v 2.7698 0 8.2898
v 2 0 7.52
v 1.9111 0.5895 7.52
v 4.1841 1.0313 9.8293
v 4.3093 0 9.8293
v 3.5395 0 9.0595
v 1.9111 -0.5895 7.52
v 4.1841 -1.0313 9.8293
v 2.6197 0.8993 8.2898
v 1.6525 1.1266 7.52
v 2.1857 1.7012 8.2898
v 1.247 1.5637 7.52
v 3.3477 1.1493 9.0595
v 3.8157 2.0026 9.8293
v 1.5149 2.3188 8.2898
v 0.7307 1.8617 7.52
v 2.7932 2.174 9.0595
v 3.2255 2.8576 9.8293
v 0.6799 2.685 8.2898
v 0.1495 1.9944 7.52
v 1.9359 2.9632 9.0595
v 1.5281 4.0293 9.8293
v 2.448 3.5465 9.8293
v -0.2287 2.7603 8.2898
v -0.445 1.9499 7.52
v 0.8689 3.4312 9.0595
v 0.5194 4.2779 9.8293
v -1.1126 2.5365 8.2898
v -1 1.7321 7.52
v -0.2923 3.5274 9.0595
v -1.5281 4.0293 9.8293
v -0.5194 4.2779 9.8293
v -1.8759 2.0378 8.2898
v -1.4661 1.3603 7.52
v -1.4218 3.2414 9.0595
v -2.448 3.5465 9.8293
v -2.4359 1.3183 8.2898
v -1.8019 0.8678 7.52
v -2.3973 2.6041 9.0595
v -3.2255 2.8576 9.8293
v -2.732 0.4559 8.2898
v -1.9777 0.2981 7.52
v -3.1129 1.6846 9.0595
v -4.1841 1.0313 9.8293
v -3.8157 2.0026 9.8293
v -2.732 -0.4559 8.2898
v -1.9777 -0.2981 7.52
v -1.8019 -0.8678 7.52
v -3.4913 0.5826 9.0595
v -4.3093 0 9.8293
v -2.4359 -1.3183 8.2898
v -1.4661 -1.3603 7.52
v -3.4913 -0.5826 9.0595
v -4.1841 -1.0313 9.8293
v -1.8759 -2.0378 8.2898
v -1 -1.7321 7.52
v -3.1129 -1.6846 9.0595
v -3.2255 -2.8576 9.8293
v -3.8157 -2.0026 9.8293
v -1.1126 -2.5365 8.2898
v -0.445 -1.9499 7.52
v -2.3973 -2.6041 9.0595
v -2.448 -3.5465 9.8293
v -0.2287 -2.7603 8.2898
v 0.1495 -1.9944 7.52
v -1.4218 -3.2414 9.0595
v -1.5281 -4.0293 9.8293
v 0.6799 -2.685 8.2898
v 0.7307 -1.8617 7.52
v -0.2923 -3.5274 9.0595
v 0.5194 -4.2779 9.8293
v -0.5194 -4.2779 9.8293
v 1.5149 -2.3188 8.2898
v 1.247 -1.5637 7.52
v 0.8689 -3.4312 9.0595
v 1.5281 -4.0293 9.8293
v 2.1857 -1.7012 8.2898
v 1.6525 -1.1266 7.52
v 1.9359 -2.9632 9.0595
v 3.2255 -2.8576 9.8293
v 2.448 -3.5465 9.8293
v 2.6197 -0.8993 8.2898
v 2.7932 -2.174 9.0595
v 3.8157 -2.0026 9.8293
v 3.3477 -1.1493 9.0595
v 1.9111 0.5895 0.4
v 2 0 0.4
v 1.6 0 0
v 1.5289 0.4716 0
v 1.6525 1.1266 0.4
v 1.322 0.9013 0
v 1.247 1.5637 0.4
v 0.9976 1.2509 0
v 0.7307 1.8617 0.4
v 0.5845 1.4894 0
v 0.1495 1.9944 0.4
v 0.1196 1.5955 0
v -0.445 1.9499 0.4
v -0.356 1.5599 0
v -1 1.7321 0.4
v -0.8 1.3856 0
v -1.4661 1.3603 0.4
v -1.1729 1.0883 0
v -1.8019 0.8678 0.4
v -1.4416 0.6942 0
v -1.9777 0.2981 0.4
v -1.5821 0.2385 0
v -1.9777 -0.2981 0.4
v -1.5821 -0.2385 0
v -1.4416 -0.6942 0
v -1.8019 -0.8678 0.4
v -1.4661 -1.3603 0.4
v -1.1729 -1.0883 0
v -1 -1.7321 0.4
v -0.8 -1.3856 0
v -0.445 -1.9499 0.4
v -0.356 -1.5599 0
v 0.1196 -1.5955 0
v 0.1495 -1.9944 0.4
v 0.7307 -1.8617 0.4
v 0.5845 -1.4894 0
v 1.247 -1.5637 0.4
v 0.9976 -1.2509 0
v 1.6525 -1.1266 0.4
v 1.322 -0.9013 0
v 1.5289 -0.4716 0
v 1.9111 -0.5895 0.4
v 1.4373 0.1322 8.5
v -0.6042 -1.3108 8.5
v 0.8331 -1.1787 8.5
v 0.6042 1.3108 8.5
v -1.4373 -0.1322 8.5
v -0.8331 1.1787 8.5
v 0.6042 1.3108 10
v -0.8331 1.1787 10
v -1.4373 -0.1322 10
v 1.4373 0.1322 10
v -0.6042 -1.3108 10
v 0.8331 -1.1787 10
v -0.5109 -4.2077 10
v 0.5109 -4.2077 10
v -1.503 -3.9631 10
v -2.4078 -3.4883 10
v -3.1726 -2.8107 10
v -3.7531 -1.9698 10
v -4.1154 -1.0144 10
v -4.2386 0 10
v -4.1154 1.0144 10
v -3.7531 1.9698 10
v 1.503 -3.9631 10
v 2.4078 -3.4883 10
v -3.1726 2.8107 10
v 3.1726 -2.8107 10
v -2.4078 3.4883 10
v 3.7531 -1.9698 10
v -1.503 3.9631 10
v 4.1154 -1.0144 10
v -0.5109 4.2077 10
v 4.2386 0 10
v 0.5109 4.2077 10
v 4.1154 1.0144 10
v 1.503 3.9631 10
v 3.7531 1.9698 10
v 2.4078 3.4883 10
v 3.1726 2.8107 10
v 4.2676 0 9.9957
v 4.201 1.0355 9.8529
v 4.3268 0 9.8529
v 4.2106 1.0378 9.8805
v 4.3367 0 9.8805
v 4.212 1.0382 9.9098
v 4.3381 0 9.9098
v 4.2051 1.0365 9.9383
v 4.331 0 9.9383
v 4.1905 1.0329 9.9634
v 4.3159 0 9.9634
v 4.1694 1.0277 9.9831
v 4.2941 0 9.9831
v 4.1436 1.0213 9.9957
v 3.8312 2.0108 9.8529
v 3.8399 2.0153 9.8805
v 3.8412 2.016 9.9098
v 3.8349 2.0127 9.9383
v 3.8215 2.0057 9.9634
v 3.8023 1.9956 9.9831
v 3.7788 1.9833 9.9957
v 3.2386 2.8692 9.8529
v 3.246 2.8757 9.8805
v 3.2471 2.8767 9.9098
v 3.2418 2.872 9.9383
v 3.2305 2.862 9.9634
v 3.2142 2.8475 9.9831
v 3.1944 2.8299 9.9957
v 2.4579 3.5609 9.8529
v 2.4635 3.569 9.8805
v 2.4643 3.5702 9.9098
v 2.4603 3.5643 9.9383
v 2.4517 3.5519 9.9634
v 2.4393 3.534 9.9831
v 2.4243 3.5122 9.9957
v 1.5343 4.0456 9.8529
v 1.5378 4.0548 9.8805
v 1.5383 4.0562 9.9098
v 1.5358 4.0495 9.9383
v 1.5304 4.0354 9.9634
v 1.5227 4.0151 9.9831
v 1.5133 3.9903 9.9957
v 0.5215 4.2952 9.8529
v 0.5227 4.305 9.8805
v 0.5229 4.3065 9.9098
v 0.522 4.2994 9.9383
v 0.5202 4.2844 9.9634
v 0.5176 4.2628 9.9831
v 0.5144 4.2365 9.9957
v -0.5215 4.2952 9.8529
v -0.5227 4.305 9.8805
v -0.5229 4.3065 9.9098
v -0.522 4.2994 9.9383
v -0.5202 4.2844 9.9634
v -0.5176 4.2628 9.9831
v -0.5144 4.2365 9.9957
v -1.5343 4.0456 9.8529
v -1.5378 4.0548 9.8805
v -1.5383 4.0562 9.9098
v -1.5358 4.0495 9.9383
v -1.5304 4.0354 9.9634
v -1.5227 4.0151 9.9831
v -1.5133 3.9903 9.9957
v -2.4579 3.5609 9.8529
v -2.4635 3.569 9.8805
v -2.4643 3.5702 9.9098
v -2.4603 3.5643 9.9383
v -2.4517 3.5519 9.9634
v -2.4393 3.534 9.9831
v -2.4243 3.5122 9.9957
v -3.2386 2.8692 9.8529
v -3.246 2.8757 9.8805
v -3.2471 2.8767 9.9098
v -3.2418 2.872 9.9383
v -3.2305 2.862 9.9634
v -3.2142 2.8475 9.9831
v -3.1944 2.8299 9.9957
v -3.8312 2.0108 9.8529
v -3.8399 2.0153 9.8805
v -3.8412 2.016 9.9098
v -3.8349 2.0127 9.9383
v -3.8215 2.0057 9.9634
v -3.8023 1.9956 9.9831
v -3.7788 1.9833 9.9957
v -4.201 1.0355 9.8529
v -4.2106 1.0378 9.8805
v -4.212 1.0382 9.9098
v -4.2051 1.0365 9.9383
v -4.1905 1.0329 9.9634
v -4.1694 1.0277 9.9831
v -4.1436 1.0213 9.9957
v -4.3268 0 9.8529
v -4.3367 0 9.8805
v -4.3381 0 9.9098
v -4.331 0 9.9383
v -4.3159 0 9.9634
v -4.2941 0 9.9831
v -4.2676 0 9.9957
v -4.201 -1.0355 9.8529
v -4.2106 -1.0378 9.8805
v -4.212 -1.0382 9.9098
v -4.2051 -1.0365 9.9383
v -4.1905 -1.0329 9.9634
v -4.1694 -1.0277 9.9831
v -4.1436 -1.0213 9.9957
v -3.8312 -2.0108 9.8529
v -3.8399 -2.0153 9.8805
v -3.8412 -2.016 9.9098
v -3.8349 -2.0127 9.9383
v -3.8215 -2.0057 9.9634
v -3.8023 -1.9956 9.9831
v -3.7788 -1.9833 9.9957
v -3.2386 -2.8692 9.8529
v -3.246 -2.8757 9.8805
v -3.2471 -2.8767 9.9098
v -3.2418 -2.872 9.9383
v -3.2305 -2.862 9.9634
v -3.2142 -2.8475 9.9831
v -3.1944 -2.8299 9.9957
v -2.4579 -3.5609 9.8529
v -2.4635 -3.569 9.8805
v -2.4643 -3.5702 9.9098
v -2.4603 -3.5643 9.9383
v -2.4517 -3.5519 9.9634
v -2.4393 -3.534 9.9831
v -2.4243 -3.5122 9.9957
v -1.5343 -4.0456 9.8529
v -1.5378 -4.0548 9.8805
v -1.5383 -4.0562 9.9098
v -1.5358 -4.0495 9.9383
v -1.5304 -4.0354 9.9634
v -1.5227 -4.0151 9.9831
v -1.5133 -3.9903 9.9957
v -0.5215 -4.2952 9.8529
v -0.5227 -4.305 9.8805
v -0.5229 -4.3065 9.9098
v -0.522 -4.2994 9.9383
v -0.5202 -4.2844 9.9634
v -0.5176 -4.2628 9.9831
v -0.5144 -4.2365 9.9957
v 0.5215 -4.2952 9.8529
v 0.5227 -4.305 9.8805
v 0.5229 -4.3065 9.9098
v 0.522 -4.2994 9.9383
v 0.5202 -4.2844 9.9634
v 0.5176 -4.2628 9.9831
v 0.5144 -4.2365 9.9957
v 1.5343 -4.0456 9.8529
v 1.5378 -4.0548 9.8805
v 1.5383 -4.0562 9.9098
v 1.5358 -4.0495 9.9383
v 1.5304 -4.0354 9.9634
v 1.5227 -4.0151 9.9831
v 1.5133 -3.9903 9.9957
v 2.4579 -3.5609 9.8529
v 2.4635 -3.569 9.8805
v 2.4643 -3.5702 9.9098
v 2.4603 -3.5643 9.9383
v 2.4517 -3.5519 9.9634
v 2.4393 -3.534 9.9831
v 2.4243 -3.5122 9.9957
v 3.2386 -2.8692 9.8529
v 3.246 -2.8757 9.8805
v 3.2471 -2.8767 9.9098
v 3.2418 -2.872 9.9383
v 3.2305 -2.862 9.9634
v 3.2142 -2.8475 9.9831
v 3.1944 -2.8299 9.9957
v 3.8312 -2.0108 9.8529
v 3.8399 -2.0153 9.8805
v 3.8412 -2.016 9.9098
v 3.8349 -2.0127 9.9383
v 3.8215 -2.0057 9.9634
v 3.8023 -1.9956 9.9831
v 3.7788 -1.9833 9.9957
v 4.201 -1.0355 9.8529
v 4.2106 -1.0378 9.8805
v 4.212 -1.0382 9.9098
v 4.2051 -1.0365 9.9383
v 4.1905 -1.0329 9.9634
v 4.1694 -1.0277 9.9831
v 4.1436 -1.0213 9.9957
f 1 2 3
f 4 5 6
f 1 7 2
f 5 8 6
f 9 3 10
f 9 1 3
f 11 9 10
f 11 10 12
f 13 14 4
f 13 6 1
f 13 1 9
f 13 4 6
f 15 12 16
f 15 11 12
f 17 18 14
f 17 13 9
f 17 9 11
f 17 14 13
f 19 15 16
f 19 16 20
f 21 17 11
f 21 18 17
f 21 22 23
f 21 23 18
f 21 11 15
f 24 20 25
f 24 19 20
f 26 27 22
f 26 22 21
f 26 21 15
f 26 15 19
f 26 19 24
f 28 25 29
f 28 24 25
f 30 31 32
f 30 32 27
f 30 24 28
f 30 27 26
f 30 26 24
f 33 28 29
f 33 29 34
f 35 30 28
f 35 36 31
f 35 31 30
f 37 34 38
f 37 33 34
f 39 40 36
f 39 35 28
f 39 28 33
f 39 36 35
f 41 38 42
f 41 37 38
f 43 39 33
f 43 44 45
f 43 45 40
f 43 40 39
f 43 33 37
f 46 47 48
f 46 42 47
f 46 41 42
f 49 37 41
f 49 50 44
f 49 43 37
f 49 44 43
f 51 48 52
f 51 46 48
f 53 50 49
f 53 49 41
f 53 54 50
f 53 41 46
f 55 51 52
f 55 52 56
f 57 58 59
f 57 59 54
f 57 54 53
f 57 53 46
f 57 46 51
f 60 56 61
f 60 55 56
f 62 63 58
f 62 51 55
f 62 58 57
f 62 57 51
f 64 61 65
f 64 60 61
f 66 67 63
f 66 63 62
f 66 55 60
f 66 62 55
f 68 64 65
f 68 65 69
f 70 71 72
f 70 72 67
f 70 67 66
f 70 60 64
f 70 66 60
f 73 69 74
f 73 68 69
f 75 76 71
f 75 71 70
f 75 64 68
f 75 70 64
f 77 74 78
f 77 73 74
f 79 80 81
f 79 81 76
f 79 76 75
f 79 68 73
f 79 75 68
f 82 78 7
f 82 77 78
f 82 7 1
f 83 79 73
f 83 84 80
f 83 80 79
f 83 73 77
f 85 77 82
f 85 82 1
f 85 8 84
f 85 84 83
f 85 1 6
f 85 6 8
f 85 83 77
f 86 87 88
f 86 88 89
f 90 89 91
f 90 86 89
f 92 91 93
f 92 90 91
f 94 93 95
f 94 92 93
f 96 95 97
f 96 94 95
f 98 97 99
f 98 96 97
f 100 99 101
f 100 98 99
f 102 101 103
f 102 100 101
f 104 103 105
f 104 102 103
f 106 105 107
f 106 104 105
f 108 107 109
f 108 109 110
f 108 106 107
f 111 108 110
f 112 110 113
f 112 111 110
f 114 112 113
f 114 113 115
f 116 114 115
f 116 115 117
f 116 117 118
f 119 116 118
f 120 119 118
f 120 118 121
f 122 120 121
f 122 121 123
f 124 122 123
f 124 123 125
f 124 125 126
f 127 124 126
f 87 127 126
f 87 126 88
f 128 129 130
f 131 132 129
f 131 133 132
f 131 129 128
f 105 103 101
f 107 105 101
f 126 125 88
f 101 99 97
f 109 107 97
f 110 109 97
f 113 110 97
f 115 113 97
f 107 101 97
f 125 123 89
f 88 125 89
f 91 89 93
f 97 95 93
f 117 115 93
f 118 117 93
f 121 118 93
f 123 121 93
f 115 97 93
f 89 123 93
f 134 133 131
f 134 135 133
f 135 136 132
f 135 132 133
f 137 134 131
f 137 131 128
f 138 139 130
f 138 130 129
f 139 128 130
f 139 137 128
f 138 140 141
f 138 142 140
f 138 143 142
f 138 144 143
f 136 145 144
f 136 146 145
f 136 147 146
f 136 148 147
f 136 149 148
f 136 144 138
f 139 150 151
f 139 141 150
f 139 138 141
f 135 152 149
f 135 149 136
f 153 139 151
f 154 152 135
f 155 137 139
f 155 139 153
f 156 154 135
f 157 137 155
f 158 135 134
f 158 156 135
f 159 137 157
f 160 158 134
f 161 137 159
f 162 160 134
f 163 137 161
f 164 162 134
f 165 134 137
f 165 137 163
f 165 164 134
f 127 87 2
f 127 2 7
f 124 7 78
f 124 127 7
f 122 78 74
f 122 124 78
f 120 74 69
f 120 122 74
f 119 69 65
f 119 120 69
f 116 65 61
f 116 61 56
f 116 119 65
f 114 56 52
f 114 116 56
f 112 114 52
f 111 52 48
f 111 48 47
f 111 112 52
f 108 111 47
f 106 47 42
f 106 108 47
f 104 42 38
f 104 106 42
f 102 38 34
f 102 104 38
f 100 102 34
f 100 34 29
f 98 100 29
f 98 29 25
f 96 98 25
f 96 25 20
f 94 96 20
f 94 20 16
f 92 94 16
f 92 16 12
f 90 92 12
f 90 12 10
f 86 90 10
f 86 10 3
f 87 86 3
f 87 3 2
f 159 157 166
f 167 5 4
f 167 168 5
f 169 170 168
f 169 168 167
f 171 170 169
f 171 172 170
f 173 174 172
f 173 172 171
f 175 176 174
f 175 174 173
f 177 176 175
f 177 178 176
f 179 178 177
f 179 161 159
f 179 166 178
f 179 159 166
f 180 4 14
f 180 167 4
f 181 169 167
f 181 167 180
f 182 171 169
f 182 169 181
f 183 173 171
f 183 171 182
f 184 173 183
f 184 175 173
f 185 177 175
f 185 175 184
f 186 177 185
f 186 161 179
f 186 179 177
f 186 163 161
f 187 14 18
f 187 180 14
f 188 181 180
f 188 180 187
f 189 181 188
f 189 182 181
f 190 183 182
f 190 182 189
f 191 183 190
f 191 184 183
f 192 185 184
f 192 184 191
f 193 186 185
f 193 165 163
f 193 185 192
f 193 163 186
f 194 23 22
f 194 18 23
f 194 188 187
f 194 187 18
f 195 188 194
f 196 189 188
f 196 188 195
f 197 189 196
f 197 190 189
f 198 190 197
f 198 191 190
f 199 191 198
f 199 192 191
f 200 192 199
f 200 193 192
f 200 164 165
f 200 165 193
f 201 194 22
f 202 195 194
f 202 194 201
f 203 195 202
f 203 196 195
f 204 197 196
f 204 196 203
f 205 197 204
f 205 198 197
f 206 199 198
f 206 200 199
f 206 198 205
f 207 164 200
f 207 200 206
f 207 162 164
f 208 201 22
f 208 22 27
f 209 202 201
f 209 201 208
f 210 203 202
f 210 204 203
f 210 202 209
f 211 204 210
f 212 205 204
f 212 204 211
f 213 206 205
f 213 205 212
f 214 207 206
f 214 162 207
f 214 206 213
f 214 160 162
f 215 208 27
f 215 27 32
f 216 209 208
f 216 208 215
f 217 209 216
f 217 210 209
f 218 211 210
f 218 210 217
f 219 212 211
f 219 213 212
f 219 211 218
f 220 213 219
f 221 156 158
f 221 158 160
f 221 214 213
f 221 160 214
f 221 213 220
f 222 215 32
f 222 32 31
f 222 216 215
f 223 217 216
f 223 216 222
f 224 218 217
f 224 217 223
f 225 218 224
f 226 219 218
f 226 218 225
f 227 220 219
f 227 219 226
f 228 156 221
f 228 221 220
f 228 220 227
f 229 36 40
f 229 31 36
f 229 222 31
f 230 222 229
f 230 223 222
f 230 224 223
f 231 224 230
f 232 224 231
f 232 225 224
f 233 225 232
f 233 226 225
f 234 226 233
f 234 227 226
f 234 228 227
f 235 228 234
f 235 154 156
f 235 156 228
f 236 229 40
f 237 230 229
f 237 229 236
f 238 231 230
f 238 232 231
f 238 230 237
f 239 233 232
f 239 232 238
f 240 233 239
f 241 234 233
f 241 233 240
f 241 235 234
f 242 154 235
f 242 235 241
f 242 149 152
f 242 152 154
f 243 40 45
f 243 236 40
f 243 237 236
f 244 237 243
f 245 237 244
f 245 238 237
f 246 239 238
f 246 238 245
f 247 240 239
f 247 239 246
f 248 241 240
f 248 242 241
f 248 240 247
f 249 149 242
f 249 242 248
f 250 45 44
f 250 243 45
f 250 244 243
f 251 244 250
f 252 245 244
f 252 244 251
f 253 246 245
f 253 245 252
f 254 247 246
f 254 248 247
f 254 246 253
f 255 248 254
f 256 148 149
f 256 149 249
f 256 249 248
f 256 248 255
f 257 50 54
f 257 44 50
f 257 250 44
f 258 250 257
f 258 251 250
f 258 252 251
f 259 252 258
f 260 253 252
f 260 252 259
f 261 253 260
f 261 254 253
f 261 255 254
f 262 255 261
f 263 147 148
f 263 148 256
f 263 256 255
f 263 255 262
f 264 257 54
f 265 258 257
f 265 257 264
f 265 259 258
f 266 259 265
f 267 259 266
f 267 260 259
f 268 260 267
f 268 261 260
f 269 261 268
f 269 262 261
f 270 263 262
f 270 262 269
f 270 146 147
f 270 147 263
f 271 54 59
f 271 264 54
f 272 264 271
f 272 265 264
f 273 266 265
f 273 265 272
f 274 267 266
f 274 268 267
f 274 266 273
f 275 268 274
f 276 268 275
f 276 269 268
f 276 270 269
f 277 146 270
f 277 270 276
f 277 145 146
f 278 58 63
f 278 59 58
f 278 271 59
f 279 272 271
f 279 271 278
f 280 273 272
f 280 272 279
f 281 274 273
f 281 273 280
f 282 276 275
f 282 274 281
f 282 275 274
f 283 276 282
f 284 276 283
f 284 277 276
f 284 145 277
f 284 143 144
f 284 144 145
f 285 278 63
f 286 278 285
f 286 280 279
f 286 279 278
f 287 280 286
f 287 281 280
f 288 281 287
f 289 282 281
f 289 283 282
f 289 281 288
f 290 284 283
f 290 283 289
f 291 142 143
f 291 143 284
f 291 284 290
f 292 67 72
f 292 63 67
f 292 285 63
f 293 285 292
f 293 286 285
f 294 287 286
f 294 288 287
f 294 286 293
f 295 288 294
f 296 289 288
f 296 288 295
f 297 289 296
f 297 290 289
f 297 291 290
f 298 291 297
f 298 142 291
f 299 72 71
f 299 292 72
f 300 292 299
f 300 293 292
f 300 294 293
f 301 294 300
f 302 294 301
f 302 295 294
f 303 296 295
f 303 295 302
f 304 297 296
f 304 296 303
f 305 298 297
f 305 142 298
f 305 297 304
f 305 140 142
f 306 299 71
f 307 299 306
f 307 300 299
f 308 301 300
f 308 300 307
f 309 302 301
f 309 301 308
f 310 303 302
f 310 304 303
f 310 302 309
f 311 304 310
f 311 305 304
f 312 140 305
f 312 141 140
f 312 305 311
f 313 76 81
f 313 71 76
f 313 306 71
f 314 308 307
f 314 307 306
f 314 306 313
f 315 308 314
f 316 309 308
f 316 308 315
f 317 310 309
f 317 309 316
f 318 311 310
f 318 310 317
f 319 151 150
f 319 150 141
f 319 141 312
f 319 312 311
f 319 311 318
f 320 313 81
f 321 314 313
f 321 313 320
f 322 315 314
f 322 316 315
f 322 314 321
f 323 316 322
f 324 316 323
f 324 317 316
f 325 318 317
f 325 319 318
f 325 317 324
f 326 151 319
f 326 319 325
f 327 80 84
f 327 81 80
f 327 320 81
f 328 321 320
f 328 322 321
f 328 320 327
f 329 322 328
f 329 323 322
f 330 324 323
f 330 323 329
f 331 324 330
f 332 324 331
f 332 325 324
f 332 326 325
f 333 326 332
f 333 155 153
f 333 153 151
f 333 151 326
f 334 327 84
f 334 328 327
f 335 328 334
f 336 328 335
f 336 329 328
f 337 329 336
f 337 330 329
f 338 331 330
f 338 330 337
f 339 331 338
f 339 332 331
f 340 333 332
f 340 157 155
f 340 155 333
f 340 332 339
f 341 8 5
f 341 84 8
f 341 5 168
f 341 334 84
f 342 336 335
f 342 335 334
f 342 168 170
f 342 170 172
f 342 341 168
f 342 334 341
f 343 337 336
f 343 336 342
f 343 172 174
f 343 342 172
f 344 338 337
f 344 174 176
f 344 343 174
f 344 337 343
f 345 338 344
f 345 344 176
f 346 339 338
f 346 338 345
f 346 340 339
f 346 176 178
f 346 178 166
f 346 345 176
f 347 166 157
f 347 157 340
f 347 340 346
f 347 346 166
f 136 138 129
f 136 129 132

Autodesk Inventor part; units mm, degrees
ref_plane "YZ Plane" through (0, 0, 0) normal (1, 0, 0) x (0, 1, 0)
ref_plane "XZ Plane" through (0, 0, 0) normal (0, 1, 0) x (-1, 0, 0)
ref_plane "XY Plane" through (0, 0, 0) normal (0, 0, 1) x (1, 0, 0)
sketch "Sketch1" plane through (0, 0, 0) normal (0, 0, 1) x (1, 0, 0)
  circle A0 centre (0, 0) radius 2
  dimension "Diameter" = 4
extrude "Extrusion1" add sketch "Sketch1" along normal blind 7.52
sketch "Sketch2" plane through (0, 0, 7.52) normal (0, 0, 1) x (1, 0, 0)
  circle A0 centre (0, 0) radius 2 projected
extrude "Extrusion2" add sketch "Sketch2" along normal blind 2.48 draft 45
sketch "Sketch3" plane through (0, 0, 10) normal (0, 0, 1) x (1, 0, 0)
  circle A0 centre (0, 0) radius 4.48 projected
  circle A1 centre (0, 0) radius 1.4434 construction
  line L0 (0.6042, 1.3108) -> (1.4373, 0.1322)
  line L1 (1.4373, 0.1322) -> (0.8331, -1.1787)
  line L2 (0.8331, -1.1787) -> (-0.6042, -1.3108)
  line L3 (-0.6042, -1.3108) -> (-1.4373, -0.1322)
  line L4 (-1.4373, -0.1322) -> (-0.8331, 1.1787)
  line L5 (-0.8331, 1.1787) -> (0.6042, 1.3108)
  dimension "Hex_Width" = 2.5
extrude "Extrusion3" cut sketch "Sketch3" against normal blind 1.5 contours L0 L1 L2 L3 L4 L5
thread "Thread1" size "M4x0.7" class "4g6g" standard "ANSI Metric M Profile" length 7.52
chamfer "Chamfer2" distance 0.4 angle 45 1 edges at (-2, 0, 0)
fillet "Fillet1" radius 0.1 1 edges at (-4.48, 0, 10)
equation "\"d10\" = Thread_Length"
equation "\"d13\" = Chamfer"
equation "\"Thread_Length\" = 7.52"
equation "\"Chamfer\" = 0.4"
properties part number "SCREW,FLAT HD,P,12.9,M4X0.7X10MM"
